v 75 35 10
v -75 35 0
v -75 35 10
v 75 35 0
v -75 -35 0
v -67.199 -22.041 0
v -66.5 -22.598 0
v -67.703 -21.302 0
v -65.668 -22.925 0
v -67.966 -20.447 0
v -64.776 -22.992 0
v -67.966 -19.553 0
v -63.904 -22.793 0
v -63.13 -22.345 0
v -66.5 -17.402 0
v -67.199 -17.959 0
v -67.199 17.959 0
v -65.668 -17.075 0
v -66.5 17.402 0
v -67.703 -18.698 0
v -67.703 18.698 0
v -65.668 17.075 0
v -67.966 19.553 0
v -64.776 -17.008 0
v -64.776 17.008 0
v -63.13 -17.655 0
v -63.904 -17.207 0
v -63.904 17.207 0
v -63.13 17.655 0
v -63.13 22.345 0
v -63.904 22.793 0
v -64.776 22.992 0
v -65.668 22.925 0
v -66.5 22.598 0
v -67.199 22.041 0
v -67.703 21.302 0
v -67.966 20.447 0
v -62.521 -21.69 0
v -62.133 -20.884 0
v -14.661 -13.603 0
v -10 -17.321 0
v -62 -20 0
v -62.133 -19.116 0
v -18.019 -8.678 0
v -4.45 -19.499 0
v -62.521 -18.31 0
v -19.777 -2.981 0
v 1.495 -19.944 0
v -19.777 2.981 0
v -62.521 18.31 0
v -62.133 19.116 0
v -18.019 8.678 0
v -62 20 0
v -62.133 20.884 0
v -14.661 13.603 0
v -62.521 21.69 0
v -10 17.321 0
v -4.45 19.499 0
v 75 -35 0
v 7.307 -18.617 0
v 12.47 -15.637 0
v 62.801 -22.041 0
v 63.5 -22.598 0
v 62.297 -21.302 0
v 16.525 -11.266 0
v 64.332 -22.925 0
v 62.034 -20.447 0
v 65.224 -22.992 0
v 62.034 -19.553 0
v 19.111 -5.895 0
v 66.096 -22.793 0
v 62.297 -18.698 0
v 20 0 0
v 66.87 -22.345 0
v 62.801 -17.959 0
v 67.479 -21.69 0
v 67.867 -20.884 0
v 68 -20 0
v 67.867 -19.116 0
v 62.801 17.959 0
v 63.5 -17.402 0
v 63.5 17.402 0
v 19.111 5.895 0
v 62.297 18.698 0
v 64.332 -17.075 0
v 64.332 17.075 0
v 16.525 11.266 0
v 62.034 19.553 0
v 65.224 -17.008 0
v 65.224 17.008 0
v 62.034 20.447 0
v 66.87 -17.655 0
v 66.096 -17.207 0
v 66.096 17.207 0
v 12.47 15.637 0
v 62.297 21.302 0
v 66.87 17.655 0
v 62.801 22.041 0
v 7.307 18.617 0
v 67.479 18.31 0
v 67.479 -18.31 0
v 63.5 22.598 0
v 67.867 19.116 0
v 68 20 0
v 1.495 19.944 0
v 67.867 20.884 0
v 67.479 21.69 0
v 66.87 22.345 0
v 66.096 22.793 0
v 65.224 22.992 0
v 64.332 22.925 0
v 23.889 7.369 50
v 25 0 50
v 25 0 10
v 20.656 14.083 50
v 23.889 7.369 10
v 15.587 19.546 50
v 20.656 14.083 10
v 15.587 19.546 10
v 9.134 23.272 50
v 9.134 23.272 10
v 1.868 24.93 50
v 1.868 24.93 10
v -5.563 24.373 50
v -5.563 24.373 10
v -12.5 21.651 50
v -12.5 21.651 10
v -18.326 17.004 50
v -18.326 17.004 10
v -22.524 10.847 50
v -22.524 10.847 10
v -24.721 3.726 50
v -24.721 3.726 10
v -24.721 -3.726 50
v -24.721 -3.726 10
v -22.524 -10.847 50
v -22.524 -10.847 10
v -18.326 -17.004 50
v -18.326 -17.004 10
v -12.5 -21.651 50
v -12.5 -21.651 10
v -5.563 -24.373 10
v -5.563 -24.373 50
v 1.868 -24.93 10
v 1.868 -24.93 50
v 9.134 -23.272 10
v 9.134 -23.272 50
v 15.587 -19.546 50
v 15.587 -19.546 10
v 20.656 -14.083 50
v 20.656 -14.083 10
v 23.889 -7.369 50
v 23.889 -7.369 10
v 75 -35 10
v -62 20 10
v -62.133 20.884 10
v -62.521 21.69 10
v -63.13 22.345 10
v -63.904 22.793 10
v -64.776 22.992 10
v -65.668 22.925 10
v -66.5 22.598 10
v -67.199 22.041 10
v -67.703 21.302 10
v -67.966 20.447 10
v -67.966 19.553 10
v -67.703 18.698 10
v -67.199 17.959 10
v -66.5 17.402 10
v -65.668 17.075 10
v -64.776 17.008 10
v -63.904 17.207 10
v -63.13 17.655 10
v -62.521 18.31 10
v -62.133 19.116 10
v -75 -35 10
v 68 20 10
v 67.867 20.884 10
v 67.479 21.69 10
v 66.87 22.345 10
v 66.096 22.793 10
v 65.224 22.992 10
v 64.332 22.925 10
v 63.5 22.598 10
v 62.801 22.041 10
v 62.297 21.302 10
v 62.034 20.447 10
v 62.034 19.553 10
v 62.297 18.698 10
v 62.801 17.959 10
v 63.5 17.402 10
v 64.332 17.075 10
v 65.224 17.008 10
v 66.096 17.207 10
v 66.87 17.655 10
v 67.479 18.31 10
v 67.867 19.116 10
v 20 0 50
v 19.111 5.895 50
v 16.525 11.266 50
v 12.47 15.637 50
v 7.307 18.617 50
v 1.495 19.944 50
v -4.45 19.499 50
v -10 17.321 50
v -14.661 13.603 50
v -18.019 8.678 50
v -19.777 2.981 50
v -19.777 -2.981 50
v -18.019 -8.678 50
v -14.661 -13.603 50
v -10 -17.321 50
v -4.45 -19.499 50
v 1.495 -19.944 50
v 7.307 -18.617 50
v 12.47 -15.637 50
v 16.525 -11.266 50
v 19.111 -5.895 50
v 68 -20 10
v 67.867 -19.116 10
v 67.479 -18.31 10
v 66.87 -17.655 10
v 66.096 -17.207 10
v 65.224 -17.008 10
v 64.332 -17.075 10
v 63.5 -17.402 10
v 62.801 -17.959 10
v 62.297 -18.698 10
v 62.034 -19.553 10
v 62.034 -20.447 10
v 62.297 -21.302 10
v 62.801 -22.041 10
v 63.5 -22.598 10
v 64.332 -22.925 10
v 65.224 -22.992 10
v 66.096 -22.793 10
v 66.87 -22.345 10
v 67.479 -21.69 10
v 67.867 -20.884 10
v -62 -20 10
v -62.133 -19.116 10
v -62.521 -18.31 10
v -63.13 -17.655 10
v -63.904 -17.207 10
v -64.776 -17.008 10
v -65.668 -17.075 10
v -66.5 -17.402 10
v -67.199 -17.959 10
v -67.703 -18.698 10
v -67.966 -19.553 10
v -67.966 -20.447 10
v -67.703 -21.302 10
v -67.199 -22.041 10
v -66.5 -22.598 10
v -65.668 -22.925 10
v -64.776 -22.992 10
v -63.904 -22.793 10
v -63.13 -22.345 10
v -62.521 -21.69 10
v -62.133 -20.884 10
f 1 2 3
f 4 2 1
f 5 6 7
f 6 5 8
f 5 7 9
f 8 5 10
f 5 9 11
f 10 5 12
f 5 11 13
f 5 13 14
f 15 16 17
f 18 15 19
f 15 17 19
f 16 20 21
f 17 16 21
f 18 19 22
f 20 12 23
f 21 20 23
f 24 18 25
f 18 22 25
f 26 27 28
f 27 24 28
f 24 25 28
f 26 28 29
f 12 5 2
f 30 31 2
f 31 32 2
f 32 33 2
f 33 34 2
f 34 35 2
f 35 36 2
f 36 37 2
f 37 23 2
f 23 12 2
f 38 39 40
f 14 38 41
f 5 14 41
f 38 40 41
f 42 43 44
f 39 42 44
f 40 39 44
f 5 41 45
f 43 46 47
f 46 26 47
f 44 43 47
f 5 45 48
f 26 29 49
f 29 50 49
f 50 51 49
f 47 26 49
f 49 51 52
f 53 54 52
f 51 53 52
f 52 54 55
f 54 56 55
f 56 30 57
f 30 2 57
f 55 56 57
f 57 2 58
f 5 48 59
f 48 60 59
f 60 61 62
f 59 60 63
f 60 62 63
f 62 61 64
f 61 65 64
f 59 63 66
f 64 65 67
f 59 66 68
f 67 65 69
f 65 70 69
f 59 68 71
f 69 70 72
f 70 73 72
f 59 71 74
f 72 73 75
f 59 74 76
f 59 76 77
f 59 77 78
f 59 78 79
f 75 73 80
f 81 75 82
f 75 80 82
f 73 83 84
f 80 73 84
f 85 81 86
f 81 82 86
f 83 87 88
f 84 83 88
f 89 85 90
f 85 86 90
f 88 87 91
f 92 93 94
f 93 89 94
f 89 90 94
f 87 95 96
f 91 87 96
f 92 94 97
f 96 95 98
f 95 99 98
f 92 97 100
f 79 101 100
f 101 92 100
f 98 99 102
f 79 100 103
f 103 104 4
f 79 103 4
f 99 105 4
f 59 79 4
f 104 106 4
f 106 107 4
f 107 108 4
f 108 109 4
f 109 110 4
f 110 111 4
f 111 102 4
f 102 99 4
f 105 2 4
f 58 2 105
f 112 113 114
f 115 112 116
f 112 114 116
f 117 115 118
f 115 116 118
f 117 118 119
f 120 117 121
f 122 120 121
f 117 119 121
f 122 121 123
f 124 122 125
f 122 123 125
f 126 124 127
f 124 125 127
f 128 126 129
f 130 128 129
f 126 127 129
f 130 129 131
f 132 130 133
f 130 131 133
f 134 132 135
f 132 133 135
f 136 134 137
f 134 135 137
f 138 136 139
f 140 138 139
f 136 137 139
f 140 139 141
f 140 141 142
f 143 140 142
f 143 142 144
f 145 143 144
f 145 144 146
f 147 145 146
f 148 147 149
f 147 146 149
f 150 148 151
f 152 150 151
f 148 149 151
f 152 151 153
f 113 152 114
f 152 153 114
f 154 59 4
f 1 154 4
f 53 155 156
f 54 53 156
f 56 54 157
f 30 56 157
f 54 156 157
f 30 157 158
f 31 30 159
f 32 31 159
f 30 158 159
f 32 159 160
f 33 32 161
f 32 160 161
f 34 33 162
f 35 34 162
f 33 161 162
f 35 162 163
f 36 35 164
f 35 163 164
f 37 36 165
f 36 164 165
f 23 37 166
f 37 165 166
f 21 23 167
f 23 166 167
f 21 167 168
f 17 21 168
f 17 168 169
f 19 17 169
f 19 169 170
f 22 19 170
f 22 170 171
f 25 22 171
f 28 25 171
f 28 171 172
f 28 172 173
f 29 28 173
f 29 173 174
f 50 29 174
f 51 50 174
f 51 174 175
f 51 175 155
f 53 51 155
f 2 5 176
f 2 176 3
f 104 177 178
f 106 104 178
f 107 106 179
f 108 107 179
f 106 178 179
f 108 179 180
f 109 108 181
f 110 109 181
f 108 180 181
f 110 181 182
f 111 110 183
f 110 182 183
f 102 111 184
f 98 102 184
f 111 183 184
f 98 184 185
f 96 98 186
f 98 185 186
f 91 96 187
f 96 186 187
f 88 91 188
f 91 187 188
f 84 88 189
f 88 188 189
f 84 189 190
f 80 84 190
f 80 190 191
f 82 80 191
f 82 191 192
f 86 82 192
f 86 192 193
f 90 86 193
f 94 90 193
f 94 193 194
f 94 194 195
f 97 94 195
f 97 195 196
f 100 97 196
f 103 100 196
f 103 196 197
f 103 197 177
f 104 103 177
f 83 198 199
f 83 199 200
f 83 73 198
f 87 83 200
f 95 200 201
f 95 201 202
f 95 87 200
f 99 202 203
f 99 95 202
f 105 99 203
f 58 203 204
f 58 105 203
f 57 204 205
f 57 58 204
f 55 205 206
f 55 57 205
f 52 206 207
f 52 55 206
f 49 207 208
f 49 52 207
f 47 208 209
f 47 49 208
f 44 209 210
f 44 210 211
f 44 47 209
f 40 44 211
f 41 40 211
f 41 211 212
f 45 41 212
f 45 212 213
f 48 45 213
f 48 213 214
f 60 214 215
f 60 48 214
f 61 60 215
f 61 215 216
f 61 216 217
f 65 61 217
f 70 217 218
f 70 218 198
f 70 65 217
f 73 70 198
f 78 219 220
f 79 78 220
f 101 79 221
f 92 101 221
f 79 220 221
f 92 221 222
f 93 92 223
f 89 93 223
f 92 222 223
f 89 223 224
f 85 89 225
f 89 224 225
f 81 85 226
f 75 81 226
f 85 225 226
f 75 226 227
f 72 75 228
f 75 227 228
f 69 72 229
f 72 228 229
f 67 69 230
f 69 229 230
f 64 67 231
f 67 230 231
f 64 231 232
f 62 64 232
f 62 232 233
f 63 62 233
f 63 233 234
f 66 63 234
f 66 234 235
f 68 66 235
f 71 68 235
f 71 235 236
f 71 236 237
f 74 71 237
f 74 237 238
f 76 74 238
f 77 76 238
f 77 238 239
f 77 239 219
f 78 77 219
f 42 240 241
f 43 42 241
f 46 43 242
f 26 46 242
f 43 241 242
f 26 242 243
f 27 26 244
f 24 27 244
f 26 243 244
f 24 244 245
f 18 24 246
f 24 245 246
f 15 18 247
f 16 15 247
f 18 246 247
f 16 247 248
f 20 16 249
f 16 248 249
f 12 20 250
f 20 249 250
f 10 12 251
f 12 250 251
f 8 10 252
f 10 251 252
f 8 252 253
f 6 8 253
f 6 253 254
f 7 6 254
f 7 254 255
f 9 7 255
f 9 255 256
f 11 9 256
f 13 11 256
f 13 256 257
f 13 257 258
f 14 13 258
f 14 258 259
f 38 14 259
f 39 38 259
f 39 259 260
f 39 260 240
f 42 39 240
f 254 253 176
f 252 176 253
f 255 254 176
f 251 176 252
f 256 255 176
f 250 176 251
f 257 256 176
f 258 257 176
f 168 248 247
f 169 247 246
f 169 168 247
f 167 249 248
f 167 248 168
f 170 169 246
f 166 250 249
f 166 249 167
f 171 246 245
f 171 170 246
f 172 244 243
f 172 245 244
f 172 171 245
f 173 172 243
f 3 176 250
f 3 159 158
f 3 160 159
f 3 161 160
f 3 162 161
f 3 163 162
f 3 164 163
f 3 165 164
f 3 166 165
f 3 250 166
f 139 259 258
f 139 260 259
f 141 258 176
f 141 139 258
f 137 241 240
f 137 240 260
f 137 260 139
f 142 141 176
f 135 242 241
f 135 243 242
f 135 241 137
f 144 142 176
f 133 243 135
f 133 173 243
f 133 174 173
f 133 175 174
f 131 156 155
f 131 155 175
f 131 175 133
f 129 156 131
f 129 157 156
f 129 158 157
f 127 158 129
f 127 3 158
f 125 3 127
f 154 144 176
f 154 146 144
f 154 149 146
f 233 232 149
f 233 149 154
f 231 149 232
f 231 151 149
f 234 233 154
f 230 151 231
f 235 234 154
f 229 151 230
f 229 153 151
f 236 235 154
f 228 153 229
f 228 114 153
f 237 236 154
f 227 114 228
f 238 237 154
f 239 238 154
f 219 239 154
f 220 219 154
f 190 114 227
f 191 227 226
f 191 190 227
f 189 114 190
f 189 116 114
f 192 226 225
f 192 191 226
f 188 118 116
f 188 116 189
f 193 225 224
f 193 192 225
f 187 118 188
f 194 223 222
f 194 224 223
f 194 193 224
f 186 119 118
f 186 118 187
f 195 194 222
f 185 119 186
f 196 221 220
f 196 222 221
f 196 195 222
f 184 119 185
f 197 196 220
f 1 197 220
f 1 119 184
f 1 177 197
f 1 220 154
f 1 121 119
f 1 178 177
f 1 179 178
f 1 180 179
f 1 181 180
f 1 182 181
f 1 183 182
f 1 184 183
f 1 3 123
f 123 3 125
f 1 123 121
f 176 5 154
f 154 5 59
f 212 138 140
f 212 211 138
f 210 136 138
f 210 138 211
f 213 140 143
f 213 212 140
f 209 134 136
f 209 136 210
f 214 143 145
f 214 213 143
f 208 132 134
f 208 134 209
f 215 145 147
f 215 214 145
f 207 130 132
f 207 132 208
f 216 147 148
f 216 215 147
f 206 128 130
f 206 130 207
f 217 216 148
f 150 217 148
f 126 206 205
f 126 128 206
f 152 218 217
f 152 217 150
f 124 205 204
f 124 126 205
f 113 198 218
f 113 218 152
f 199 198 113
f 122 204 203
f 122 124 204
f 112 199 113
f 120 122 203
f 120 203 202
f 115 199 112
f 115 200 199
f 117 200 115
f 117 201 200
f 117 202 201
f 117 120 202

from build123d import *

# Parameters (mm, degrees)
SKETCH1_W           = 150
SKETCH1_H           = 70
SKETCH1_R           = 25
SKETCH1_R_2         = 20
BOSS_EXTRUDE1_DEPTH = 10
BOSS_EXTRUDE2_START = 10
SKETCH1_3_R         = 25
SKETCH1_3_R_2       = 20
BOSS_EXTRUDE2_DEPTH = 40
SKETCH6_R           = 3
CUT_EXTRUDE1_DEPTH  = 11


with BuildPart() as part:
    # Sketch1 → Boss-Extrude1 (new body)
    with BuildSketch(Plane.XY):
        Rectangle(SKETCH1_W, SKETCH1_H)
        Circle(SKETCH1_R, mode=Mode.SUBTRACT)
        Circle(SKETCH1_R)
        Circle(SKETCH1_R_2, mode=Mode.SUBTRACT)
    extrude(amount=BOSS_EXTRUDE1_DEPTH)

    # Sketch1<3> → Boss-Extrude2 (add)
    with BuildSketch(Plane.XY.offset(BOSS_EXTRUDE2_START)):
        Circle(SKETCH1_3_R)
        Circle(SKETCH1_3_R_2, mode=Mode.SUBTRACT)
    extrude(amount=BOSS_EXTRUDE2_DEPTH)

    # Sketch6 → Cut-Extrude1 (cut, through all)
    with BuildSketch(Plane.XY.offset(10)):
        with Locations((-65, 20)):
            Circle(SKETCH6_R)
        with Locations((-65, -20)):
            Circle(SKETCH6_R)
        with Locations((65, -20)):
            Circle(SKETCH6_R)
        with Locations((65, 20)):
            Circle(SKETCH6_R)
    extrude(amount=-CUT_EXTRUDE1_DEPTH, mode=Mode.SUBTRACT)


solid = part.part
